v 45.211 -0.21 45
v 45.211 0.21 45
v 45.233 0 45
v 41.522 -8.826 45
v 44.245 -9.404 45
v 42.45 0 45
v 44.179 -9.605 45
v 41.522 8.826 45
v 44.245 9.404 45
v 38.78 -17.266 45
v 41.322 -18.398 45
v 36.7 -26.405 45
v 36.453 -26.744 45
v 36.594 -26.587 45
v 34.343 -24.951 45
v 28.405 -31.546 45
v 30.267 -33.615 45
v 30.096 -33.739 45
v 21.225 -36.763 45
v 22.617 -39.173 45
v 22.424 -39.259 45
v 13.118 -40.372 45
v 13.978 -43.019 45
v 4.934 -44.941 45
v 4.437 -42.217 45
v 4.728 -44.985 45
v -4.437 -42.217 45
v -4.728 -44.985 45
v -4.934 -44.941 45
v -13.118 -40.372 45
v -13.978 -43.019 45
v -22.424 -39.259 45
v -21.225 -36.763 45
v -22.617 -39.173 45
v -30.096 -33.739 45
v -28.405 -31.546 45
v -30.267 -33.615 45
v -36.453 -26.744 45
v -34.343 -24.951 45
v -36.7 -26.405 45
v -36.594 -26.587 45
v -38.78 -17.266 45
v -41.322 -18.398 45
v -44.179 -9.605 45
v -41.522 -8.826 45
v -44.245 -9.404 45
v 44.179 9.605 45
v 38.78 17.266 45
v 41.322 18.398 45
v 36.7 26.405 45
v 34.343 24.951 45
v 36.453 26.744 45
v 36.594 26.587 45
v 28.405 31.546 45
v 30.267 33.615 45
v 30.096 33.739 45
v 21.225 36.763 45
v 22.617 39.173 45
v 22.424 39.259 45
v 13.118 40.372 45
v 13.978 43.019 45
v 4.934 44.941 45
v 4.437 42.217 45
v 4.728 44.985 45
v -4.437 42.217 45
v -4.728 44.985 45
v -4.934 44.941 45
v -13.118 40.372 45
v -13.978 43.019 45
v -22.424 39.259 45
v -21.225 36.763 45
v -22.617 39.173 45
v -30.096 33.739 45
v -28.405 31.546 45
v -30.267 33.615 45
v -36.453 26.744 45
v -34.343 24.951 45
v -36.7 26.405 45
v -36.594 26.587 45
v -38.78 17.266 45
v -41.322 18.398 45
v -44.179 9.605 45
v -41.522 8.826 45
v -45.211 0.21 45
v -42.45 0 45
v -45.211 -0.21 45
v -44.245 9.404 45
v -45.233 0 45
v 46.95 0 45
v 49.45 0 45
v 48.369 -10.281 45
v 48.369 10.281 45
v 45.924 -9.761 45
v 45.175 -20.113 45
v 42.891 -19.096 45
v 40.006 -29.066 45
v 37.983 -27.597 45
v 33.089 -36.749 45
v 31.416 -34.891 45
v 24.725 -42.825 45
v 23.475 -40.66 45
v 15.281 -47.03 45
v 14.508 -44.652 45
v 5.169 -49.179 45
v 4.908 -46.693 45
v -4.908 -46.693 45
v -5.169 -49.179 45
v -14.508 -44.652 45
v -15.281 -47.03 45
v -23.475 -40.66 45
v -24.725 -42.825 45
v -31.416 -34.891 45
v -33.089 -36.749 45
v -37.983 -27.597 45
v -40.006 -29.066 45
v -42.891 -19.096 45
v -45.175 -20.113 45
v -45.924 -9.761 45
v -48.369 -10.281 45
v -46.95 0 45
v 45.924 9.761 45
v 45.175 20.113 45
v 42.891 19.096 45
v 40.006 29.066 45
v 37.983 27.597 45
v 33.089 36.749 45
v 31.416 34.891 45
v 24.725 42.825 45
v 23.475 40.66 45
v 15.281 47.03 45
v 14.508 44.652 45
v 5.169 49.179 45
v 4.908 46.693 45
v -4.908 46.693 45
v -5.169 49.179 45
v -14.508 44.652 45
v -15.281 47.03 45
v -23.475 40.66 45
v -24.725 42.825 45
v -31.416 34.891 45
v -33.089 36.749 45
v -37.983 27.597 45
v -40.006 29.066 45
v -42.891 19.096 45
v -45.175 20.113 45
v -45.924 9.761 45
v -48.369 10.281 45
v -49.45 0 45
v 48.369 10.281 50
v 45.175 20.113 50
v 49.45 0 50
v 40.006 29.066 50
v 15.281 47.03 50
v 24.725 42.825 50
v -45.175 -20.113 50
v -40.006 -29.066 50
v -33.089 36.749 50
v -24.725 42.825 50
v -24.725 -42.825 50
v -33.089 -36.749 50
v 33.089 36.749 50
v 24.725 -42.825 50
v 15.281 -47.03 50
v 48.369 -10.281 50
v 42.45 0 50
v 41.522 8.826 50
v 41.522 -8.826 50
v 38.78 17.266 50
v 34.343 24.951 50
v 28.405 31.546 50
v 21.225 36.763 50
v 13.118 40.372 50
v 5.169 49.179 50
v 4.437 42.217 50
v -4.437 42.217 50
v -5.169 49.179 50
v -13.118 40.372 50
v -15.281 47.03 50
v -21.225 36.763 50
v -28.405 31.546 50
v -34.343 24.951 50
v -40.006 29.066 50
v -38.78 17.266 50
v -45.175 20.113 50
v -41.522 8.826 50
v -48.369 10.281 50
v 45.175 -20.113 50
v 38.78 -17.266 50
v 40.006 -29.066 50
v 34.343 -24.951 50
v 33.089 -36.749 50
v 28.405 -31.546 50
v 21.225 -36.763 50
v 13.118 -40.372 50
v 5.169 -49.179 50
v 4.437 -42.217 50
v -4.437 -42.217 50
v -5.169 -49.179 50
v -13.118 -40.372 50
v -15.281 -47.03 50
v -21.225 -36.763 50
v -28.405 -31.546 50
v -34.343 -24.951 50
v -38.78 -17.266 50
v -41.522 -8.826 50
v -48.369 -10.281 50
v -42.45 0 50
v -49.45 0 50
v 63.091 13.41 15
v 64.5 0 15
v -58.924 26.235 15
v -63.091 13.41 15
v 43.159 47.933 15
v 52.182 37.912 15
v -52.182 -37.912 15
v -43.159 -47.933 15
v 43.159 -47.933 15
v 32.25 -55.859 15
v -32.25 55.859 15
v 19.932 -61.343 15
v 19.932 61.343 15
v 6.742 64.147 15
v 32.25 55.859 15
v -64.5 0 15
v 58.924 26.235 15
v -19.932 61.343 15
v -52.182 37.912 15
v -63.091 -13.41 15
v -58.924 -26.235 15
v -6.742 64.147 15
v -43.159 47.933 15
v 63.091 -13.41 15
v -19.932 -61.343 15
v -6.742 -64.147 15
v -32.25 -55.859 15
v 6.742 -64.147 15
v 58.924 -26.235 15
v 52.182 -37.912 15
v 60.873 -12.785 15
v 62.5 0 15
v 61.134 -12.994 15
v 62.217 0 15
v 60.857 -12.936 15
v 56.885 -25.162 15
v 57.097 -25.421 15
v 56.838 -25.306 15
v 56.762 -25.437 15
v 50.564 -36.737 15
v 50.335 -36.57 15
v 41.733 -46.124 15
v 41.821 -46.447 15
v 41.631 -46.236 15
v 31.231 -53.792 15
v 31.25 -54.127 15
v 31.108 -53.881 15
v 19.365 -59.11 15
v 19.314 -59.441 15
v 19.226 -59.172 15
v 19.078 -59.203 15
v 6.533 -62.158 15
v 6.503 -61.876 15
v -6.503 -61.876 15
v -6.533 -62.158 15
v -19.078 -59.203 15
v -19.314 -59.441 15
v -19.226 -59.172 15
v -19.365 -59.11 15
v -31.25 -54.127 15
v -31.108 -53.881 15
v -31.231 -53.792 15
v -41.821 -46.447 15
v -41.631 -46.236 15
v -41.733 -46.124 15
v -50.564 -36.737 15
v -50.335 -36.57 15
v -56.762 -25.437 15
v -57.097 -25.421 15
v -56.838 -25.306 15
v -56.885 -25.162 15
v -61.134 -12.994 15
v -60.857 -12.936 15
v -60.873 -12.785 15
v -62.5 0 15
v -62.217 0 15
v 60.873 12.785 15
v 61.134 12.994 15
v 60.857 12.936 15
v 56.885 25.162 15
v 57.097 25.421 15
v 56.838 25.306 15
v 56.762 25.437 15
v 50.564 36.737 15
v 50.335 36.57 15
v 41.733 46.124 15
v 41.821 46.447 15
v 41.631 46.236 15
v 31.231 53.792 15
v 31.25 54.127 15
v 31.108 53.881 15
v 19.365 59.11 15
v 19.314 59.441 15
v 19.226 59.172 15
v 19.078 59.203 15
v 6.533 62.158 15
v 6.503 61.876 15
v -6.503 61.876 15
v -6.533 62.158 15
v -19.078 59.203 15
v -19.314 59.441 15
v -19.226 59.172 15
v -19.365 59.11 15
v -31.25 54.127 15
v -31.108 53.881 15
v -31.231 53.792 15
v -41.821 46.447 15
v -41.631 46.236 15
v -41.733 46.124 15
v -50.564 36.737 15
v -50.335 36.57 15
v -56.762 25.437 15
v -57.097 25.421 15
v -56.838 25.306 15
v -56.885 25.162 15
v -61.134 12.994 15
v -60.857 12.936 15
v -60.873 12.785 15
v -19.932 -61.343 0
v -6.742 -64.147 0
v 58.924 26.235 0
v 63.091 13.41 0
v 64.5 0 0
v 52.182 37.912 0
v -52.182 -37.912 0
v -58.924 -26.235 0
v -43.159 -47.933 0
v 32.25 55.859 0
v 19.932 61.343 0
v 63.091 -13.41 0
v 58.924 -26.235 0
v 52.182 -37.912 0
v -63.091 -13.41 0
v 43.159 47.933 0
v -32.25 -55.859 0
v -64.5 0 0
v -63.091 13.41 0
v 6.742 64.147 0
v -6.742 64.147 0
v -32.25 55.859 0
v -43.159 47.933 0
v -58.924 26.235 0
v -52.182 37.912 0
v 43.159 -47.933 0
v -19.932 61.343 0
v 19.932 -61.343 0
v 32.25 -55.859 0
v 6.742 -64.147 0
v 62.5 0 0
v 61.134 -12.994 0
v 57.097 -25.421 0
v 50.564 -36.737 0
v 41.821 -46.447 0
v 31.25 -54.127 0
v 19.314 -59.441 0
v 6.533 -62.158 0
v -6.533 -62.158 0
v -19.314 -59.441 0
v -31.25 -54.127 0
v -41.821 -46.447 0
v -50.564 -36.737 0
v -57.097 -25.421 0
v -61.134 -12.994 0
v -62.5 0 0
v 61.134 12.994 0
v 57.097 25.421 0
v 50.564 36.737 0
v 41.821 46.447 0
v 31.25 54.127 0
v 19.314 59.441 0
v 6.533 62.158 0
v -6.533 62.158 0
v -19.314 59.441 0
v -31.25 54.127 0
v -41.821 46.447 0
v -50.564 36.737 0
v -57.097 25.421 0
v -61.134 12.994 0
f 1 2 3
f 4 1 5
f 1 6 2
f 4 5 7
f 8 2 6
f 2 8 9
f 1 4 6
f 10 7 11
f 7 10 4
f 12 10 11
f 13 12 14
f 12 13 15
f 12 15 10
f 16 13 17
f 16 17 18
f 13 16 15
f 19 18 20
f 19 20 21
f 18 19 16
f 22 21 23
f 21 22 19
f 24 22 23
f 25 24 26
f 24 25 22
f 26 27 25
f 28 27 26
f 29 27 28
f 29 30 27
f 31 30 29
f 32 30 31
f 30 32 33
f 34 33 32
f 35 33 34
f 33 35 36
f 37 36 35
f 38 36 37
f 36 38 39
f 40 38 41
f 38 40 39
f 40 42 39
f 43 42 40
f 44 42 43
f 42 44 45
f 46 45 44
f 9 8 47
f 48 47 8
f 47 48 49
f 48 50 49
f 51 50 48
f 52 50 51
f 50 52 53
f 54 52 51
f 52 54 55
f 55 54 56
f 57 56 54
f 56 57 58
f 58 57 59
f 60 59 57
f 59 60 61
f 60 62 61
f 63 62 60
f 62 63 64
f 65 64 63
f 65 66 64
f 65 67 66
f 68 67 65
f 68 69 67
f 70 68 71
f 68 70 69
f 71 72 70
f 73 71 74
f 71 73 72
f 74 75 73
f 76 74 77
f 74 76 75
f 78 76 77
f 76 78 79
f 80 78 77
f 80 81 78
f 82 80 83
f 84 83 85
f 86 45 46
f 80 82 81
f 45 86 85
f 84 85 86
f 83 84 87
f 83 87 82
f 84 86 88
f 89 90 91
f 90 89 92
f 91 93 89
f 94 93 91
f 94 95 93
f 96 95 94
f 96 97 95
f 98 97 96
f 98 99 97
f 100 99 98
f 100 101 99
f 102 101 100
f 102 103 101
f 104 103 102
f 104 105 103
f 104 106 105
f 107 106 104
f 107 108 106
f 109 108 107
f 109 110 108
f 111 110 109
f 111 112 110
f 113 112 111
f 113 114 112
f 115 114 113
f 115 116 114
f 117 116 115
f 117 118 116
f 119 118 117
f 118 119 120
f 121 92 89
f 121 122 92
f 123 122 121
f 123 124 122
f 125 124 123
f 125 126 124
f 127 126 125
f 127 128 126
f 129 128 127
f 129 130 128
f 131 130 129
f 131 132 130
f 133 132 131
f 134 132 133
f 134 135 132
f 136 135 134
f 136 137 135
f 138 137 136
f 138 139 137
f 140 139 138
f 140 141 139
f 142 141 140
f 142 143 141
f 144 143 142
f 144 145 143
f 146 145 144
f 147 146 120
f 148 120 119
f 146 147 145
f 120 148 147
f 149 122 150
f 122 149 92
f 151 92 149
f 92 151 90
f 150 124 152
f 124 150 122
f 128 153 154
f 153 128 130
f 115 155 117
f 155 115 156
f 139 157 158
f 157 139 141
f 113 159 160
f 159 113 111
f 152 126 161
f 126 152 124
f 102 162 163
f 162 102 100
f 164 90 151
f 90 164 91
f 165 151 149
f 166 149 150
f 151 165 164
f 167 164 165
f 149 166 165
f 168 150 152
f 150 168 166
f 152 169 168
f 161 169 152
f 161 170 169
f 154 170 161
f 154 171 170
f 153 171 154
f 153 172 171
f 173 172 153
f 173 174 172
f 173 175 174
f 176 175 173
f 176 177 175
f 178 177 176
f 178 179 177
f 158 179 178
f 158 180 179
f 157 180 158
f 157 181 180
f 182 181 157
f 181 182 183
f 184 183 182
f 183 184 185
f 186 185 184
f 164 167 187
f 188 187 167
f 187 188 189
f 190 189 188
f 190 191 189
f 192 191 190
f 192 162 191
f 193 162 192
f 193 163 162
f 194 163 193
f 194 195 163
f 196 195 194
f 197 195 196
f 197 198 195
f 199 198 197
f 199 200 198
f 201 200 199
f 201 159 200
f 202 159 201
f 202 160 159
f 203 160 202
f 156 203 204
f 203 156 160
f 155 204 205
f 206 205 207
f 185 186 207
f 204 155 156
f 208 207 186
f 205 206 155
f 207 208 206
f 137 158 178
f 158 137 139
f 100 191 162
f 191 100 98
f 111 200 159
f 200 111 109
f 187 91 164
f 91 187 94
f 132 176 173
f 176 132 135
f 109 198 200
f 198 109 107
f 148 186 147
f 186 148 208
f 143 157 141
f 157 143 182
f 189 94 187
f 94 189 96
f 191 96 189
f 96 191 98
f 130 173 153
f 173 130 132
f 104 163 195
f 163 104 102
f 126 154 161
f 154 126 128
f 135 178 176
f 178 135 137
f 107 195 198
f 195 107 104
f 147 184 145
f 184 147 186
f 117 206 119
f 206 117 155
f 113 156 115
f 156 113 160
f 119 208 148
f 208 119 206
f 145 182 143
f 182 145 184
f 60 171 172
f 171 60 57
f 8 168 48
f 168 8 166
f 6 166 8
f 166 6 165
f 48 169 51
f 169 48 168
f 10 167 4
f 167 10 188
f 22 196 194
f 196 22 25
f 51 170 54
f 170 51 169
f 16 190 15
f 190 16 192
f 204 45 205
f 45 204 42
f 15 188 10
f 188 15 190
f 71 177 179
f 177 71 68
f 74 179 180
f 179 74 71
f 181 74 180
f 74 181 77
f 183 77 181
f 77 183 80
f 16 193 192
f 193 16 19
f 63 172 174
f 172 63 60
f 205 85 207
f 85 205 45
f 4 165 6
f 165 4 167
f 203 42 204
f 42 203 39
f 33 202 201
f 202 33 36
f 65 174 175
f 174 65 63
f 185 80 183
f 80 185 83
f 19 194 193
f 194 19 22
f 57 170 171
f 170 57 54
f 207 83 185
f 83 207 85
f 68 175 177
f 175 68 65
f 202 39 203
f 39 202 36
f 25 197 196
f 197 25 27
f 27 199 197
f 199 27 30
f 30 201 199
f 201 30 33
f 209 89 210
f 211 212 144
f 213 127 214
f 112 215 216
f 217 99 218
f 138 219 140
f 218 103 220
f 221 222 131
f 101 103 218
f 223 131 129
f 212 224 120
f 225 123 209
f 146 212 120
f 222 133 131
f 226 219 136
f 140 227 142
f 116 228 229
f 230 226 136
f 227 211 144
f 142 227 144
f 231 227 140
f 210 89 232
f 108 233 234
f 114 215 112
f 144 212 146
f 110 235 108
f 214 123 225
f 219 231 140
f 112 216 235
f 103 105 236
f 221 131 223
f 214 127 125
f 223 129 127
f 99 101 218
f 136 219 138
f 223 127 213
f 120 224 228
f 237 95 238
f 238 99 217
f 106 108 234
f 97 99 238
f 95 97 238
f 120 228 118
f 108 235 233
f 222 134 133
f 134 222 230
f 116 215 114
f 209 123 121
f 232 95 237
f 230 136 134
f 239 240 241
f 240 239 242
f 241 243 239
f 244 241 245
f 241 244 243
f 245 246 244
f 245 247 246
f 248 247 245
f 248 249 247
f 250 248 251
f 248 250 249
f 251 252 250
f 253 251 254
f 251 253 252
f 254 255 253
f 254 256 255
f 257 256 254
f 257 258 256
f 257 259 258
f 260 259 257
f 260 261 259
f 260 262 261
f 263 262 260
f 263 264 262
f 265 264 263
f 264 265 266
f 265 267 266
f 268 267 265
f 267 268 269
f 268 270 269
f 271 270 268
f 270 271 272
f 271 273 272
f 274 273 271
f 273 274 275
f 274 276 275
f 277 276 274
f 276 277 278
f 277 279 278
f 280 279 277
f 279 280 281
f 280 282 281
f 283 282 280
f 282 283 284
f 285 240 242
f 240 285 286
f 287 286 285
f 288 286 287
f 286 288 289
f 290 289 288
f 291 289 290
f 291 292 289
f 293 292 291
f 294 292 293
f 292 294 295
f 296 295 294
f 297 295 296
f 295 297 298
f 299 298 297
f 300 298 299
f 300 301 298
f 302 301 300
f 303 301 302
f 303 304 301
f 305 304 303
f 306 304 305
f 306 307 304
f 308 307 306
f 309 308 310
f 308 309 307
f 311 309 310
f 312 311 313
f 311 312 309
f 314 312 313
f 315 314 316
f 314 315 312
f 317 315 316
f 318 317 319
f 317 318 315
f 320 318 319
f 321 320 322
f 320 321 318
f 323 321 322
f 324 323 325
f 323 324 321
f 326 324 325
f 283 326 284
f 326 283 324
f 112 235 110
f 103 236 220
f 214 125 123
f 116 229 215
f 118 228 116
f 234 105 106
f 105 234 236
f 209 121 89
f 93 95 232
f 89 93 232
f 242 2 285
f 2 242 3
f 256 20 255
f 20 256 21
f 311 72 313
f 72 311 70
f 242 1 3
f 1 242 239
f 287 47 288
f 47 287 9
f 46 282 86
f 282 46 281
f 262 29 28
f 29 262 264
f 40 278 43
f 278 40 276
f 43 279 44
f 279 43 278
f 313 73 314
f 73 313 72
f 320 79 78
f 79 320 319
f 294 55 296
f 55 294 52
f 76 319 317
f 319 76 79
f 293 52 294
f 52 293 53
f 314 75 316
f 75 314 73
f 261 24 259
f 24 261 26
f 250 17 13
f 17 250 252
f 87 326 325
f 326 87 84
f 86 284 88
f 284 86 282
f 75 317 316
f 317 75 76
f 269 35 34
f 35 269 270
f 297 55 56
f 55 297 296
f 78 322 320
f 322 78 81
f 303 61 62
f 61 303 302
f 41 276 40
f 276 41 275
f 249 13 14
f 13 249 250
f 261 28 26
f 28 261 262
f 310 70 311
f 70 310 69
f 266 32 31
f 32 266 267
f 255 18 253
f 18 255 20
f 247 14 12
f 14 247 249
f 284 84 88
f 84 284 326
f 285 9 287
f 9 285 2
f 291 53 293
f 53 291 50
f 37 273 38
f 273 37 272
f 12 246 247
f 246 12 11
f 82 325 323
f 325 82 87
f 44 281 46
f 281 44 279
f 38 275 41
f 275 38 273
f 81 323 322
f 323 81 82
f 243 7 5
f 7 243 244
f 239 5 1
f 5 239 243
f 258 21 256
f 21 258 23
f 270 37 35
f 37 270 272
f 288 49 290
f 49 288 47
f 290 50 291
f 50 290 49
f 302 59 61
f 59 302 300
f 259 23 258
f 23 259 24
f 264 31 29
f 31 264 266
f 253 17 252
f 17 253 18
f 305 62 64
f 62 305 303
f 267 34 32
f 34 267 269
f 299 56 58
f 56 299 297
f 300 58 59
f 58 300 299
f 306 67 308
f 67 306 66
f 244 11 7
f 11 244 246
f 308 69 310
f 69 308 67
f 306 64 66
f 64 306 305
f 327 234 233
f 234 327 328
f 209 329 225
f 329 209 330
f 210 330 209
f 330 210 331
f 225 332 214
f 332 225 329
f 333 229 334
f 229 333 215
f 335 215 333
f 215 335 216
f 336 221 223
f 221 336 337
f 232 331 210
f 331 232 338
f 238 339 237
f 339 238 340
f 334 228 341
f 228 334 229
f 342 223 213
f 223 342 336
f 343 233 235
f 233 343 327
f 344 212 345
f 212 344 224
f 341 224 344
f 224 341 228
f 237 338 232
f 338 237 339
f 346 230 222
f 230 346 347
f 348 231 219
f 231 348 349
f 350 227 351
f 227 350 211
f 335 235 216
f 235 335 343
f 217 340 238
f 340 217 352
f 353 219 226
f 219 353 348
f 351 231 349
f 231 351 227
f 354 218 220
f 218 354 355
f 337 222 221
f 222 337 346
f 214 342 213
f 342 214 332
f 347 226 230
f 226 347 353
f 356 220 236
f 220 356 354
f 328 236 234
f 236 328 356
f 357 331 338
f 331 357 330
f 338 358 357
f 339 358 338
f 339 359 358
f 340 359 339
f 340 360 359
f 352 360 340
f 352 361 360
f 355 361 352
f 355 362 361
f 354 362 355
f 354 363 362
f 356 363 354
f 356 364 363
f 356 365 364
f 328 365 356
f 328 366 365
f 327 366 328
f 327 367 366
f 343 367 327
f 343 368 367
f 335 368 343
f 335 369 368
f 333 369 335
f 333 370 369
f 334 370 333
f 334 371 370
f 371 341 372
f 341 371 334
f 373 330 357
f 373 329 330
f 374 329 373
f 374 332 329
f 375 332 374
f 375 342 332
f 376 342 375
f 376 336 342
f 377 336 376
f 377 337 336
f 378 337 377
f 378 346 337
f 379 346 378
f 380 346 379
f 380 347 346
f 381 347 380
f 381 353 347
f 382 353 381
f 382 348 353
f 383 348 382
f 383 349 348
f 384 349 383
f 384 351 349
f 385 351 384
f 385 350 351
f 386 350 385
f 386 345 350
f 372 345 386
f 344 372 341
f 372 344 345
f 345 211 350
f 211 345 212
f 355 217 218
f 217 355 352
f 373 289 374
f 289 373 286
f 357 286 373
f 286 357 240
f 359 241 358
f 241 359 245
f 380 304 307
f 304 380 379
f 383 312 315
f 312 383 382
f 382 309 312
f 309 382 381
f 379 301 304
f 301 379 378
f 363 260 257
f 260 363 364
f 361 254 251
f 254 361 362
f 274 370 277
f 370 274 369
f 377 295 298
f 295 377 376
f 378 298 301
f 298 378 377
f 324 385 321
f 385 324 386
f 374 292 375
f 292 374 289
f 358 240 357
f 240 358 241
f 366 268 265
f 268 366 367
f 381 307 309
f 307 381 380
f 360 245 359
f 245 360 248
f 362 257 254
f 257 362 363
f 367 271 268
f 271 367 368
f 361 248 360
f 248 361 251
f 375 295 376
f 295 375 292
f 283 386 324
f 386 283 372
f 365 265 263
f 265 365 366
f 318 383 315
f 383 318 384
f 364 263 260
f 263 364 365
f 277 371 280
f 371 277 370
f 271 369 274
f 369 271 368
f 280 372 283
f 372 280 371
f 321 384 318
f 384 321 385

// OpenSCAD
twidth=3.5*25.4;
bwidth=(5*25.4)-2;
height=50;
theight=5;
bheight=15;
mheight=height-theight-bheight;
width=2;
lip=5;

union()
{translate([0,0,bheight+mheight]){
difference()
{
    cylinder(h=theight,r=twidth/2+lip);
    translate([0,0,-.5])
    cylinder(h=theight+1,r=(twidth/2)-width);
}}
translate([0,0,bheight]){
difference()
{
    cylinder(h=mheight,r1=(bwidth/2+width),r2=(twidth/2)+(lip/2));
    translate([0,0,-.5])
    cylinder(h=mheight+1,r1=(bwidth/2),r2=(twidth/2)-width+(lip/2));
}
}
difference()
{
    cylinder(h=bheight,r=bwidth/2+width);
    translate([0,0,-.5])
    cylinder(h=bheight+1,r=(bwidth/2));
}
}
